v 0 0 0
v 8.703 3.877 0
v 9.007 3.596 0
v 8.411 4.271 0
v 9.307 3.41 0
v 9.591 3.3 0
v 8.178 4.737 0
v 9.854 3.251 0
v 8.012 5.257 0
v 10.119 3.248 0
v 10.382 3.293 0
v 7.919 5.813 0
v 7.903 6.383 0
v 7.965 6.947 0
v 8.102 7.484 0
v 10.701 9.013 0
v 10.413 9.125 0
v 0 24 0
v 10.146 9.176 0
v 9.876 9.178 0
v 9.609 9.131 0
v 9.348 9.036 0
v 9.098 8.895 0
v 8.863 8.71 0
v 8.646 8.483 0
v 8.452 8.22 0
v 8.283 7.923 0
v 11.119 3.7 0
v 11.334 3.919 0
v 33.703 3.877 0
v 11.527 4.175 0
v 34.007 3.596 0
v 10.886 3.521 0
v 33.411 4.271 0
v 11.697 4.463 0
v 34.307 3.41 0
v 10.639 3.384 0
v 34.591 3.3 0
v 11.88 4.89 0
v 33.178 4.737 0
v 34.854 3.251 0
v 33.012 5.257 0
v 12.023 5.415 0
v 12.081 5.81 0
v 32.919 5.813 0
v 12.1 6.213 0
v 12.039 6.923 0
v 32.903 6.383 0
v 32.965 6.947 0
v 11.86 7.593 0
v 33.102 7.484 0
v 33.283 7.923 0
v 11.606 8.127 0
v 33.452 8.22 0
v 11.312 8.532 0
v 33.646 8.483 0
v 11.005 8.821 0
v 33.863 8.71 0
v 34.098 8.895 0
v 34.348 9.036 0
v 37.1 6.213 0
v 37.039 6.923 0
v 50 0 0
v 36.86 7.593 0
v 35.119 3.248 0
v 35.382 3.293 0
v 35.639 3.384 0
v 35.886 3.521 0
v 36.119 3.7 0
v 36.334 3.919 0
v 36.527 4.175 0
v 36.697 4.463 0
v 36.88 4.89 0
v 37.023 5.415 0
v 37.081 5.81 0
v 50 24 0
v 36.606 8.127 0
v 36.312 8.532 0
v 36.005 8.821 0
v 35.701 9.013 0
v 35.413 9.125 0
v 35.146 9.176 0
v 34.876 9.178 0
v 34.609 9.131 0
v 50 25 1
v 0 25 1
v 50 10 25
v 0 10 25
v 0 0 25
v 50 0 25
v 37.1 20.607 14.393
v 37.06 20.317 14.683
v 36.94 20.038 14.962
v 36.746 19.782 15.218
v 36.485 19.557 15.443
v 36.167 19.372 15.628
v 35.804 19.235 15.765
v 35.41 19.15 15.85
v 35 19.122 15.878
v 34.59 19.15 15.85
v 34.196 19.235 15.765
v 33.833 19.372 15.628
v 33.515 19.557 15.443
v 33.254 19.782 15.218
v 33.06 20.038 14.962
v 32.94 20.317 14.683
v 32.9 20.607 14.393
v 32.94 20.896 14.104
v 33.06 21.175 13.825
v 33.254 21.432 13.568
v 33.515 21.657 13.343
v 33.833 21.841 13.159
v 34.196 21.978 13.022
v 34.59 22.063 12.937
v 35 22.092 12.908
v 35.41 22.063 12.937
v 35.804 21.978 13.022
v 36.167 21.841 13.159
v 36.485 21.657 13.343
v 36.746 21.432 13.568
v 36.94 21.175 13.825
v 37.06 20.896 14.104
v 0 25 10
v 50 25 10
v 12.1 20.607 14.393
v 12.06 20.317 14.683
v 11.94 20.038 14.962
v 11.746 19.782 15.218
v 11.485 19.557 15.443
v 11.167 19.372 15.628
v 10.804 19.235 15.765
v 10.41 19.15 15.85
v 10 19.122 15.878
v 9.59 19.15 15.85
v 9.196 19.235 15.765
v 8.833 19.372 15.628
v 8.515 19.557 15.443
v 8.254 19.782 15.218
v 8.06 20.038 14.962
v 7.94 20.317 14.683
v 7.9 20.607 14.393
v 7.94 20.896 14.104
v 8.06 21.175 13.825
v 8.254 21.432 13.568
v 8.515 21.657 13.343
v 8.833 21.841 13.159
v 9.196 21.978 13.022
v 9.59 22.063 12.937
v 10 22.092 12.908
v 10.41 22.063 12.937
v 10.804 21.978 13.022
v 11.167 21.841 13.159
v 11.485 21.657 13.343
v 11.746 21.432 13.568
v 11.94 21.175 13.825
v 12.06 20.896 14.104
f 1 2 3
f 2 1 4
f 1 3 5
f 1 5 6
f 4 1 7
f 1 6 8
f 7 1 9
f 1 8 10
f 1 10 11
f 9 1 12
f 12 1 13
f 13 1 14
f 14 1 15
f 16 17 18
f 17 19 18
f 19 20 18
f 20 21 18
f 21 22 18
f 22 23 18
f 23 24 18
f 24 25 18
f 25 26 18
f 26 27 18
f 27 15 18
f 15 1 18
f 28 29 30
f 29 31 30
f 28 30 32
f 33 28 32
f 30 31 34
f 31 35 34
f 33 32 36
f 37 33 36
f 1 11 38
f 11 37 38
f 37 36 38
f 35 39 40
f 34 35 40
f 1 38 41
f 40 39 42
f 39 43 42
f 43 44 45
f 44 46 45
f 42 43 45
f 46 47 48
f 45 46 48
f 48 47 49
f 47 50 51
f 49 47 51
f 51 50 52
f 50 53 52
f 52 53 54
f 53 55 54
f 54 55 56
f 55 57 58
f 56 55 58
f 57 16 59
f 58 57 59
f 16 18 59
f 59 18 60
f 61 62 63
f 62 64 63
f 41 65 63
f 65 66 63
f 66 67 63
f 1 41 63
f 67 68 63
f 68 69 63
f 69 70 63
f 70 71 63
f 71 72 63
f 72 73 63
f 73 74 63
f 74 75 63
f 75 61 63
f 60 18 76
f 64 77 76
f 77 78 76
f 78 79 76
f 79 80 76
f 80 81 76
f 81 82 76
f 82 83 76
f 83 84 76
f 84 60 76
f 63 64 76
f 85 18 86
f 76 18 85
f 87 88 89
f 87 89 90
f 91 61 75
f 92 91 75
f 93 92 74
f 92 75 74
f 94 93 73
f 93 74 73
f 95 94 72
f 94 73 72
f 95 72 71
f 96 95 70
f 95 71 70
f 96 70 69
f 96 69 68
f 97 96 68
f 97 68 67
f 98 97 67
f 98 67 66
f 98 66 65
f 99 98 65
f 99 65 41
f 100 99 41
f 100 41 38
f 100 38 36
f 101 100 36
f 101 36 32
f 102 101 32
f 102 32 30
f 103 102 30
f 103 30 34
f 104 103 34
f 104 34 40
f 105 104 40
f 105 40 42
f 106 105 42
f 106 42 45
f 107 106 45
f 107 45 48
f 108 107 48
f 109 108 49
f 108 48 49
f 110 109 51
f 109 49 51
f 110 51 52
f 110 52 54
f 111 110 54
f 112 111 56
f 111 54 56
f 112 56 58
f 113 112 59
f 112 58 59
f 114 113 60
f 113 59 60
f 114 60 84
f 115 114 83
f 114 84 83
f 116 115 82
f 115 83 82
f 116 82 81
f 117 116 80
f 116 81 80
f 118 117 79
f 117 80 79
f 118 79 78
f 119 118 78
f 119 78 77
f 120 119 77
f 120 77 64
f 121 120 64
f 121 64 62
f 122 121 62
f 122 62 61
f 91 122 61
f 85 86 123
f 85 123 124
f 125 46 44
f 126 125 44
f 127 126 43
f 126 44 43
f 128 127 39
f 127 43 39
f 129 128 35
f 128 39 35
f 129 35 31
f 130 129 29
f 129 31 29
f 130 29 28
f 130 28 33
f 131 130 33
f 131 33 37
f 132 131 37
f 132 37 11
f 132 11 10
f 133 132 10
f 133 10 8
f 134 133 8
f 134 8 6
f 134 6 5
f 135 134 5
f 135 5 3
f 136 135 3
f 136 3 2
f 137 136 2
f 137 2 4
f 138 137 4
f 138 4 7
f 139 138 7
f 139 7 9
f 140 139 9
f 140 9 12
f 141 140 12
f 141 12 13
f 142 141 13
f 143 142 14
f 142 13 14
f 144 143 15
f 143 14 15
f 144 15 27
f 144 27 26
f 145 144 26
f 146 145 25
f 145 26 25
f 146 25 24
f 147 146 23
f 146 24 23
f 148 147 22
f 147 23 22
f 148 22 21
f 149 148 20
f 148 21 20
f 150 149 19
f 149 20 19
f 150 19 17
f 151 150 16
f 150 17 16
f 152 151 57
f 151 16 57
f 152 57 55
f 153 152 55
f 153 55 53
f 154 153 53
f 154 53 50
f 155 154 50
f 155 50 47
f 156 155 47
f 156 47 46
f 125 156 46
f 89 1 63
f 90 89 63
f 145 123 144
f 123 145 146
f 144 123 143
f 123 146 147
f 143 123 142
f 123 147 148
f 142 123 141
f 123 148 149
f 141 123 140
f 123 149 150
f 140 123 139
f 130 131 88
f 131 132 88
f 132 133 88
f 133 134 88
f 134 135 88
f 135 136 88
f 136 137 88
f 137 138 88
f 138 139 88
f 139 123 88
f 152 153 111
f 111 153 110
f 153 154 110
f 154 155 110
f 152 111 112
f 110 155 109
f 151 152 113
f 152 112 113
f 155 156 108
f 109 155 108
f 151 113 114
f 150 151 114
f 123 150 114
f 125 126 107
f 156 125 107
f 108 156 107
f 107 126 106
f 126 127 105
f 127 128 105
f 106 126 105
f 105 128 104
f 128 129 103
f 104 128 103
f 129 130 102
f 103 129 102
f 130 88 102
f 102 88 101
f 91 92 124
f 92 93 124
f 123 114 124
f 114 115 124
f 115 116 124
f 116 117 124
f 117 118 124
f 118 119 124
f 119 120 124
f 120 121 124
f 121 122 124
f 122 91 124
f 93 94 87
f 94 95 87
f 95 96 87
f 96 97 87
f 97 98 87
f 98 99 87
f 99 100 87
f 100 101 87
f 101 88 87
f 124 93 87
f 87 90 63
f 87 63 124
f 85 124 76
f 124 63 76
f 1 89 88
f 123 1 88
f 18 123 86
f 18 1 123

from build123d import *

# Parameters (mm, degrees)
F0_W     = 50
F0_H     = 25
F1_DEPTH = 25
F2_SIZE  = 15
F4_D     = 4.2
F5_SIZE  = 1


with BuildPart() as f1:
    # F0 (on Top) → F1 (new body)
    with BuildSketch(Plane.XY):
        with Locations((25, 12.5)):
            Rectangle(F0_W, F0_H)
    extrude(amount=F1_DEPTH)

    # F2
    f2_edges = [f1.edges().sort_by_distance(p)[0] for p in [
        (25, 25, 25),
    ]]
    chamfer(f2_edges, length=F2_SIZE)

    # F4 (through all)
    with Locations(Plane(origin=(0, 17.5, 17.5), x_dir=(-1, 0, 0), z_dir=(0, 0.7071067812, 0.7071067812))):
        with Locations((-10, -4.3933982822), (-35, -4.3933982822)):
            Hole(F4_D / 2)

    # F5
    f5_edges = [f1.edges().sort_by_distance(p)[0] for p in [
        (25, 25, 0),
    ]]
    chamfer(f5_edges, length=F5_SIZE)


solid = f1.part
